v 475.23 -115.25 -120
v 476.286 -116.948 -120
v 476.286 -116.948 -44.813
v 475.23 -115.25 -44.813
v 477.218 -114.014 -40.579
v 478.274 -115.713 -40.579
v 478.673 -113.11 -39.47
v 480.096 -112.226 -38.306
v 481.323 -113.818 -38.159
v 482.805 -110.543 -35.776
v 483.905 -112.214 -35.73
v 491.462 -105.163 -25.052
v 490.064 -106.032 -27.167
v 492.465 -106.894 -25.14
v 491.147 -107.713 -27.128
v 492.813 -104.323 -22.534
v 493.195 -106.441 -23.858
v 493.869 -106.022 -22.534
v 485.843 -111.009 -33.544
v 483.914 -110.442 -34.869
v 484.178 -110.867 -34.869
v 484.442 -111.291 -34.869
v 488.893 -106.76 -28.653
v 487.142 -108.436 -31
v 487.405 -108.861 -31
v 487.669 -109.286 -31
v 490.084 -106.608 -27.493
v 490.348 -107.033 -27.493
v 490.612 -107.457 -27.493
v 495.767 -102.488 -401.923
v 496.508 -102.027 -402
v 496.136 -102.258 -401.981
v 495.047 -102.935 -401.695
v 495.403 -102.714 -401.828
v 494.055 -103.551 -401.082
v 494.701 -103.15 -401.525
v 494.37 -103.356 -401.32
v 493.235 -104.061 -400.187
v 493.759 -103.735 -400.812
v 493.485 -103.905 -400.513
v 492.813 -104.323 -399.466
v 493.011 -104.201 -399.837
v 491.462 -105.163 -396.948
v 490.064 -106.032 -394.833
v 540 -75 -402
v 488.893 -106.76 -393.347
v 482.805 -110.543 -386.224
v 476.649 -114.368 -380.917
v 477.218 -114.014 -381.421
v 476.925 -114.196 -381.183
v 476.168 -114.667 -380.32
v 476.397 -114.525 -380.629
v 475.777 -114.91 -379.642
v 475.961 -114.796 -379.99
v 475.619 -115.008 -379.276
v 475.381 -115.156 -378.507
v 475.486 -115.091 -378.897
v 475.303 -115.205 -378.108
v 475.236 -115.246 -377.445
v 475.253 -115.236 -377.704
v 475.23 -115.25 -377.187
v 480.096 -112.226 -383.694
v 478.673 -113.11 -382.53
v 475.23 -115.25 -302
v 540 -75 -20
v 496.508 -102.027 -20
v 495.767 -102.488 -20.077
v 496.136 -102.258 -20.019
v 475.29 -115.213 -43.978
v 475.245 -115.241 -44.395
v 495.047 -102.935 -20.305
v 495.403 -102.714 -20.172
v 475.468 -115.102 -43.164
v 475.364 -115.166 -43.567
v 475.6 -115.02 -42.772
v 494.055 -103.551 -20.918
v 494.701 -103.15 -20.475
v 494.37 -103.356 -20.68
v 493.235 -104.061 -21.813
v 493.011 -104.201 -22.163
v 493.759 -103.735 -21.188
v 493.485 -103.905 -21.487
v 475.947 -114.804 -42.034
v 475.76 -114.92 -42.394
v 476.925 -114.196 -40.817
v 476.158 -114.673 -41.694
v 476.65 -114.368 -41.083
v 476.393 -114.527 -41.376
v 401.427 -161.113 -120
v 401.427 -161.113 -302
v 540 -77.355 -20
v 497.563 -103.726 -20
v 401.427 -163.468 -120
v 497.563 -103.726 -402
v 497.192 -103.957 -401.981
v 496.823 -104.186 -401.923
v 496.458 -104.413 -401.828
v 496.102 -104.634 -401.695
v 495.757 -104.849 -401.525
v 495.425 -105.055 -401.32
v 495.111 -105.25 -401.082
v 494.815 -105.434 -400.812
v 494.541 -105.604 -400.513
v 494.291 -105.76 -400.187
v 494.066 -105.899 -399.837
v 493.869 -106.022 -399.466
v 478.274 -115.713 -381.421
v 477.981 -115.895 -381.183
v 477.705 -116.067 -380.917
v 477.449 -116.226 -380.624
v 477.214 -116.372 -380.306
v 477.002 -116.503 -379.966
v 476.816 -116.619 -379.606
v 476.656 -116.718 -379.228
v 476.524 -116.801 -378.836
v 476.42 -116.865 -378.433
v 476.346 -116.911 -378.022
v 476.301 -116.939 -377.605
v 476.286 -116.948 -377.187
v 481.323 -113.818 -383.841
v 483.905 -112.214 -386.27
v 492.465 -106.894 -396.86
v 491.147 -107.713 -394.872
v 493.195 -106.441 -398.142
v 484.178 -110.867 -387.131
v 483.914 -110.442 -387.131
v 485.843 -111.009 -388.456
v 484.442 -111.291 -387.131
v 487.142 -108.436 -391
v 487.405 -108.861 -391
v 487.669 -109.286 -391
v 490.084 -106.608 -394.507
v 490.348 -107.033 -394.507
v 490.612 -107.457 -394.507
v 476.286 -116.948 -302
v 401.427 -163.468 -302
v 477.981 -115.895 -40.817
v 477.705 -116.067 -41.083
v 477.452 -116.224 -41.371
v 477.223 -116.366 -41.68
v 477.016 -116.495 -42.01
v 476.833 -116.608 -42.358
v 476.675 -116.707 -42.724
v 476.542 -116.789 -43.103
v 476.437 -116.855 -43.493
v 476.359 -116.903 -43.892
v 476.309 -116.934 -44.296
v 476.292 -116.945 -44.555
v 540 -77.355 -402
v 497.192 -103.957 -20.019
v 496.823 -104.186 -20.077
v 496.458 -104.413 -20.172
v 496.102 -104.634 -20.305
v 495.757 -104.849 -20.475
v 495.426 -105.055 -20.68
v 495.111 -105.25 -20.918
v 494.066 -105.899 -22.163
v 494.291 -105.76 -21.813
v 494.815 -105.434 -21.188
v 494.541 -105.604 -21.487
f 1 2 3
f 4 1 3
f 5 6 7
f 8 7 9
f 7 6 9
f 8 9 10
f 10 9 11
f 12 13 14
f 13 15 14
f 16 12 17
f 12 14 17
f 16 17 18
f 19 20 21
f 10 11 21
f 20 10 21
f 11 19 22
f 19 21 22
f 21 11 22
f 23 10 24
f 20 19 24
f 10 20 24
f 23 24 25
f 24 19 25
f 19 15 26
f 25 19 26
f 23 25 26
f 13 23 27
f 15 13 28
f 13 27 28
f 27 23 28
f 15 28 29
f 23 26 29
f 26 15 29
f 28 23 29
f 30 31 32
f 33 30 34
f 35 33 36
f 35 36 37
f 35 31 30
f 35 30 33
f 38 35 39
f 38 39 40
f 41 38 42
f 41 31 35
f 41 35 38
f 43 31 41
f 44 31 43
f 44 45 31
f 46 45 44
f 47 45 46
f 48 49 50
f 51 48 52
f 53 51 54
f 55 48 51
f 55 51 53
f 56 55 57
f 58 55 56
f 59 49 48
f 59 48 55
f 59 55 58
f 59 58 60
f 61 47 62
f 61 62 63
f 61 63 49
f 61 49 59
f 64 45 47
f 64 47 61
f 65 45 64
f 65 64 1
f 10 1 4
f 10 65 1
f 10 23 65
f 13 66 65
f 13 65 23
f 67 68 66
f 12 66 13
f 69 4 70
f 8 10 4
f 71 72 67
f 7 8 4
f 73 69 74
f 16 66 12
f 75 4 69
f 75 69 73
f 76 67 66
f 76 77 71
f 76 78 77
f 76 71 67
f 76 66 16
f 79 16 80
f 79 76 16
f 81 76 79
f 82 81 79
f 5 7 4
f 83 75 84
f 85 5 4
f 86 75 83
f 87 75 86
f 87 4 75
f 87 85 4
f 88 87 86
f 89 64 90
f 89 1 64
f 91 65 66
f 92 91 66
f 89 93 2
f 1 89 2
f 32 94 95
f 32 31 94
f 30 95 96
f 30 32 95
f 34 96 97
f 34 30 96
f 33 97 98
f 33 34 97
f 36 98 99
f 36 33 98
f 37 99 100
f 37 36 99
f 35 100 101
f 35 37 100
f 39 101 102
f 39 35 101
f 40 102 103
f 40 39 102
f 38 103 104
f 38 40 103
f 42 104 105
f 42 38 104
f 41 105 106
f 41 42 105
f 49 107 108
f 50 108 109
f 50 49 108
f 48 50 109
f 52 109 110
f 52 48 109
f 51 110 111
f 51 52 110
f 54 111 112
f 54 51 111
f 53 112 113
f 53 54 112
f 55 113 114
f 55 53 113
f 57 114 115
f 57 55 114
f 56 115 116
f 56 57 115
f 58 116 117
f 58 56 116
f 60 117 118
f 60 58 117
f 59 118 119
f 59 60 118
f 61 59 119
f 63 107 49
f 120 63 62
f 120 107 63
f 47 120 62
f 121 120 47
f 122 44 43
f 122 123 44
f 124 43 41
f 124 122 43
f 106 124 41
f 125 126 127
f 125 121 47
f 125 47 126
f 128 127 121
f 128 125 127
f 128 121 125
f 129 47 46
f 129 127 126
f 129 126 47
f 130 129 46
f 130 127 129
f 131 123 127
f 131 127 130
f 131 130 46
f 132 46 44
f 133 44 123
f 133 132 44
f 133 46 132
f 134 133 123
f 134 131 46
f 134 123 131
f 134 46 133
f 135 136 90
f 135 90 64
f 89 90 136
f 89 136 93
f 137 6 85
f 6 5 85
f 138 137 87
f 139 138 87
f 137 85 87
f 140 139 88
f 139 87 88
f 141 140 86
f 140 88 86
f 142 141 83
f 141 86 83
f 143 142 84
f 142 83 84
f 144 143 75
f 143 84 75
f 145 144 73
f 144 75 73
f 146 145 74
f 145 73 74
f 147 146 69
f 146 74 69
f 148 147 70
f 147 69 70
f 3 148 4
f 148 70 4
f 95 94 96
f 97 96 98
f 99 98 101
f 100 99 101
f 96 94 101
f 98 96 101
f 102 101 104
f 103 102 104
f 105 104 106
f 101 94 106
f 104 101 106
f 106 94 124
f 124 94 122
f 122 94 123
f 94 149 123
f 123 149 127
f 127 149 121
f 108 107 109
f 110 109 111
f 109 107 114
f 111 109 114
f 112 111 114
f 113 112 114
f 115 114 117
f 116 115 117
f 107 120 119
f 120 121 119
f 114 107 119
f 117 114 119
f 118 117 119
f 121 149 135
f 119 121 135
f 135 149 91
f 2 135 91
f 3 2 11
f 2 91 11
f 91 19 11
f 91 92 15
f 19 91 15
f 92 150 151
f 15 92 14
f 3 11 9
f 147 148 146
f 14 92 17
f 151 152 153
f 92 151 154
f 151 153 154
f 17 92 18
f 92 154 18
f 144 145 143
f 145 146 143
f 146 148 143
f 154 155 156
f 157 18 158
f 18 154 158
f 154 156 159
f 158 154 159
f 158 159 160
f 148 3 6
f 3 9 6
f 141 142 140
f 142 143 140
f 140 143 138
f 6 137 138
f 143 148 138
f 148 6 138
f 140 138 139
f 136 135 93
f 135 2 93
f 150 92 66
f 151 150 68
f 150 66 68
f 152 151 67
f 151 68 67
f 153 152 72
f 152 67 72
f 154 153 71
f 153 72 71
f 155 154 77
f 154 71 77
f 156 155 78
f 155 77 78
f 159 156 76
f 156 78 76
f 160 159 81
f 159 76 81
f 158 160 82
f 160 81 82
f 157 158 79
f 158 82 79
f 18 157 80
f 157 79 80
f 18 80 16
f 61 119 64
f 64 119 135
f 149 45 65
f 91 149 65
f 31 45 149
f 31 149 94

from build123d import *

# Parameters (mm, degrees)
SKETCH1_W           = 163.150096709
SKETCH1_H           = 382
BOSS_EXTRUDE1_DEPTH = 2
SKETCH2_W           = 86.892857143
SKETCH2_H           = 128
CUT_EXTRUDE1_DEPTH  = 582.357037259
SKETCH3_W           = 86.892857143
SKETCH3_H           = 100
CUT_EXTRUDE2_DEPTH  = 582.357037259
DRAFT1_ANGLE        = -31.857998891
DRAFT2_ANGLE        = 31.857998891
CUT_EXTRUDE3_DEPTH  = 581.711321285
FILLET1_R           = 5


with BuildPart() as part:
    # Sketch1 → Boss-Extrude1 (new body)
    with BuildSketch(Plane(origin=(184.061246273, -296.190511244, 0), x_dir=(-0.8493588352433418, -0.5278158476155048, 0), z_dir=(-0.5278158476155048, 0.8493588352433418, 0))):
        with Locations((-337.492534105, -211)):
            Rectangle(SKETCH1_W, SKETCH1_H)
    extrude(amount=-BOSS_EXTRUDE1_DEPTH)

    # Sketch2 → Cut-Extrude1 (cut, through all)
    with BuildSketch(Plane(origin=(185.116877969, -297.889228915, 0), x_dir=(0.8493588352433415, 0.5278158476155054, 0), z_dir=(0.5278158476155053, -0.8493588352433414, 0))):
        with Locations((299.363914323, -56)):
            Rectangle(SKETCH2_W, SKETCH2_H)
    extrude(amount=-CUT_EXTRUDE1_DEPTH, mode=Mode.SUBTRACT)

    # Sketch3 → Cut-Extrude2 (cut, through all)
    with BuildSketch(Plane(origin=(185.116877969, -297.889228915, 0), x_dir=(0.8493588352433415, 0.5278158476155054, 0), z_dir=(0.5278158476155053, -0.8493588352433414, 0))):
        with Locations((299.363914323, -352)):
            Rectangle(SKETCH3_W, SKETCH3_H)
    extrude(amount=-CUT_EXTRUDE2_DEPTH, mode=Mode.SUBTRACT)

    # Draft1
    draft1_faces = [part.faces().sort_by_distance(p)[0] for p in [
        (540.527815848, -75.849358835, -211),
    ]]
    draft(draft1_faces, Plane(origin=(184.061246273, -296.190511244, 0), x_dir=(0.8493588352433418, 0.5278158476155048, 0), z_dir=(-0.5278158476155048, 0.8493588352433418, 0)), DRAFT1_ANGLE)

    # Draft2
    draft2_faces = [part.faces().sort_by_distance(p)[0] for p in [
        (401.954839737, -161.962565418, -211),
    ]]
    draft(draft2_faces, Plane(origin=(184.061246273, -296.190511244, 0), x_dir=(0.8493588352433418, 0.5278158476155048, 0), z_dir=(-0.5278158476155048, 0.8493588352433418, 0)), DRAFT2_ANGLE)

    # Sketch4 → Cut-Extrude3 (cut, through all)
    with BuildSketch(Plane(origin=(185.116877969, -297.889228915, 0), x_dir=(0.8493588352433418, 0.5278158476155048, 0), z_dir=(0.5278158476155048, -0.8493588352433418, 0))):
        with BuildLine():
            Line((342.810342894, -20), (364.810342894, -20))
            add(Edge.make_bspline(
                [(342.810342894, -42), (346.302683554, -39.942808378), (351.300668251, -36.660712559), (356.350274178, -31.060781412), (361.089343651, -26.696748792), (363.56593564, -22.694365369), (364.810342894, -20)],
                knots=[0, 0, 0, 0, 0.388085015, 0.560148038, 0.716552584, 1, 1, 1, 1], degree=3))
            Line((342.810342894, -42), (342.810342894, -20))
        make_face()
        with BuildLine():
            Line((342.810342894, -380), (342.810342894, -402))
            Line((342.810342894, -402), (364.810342894, -402))
            add(Edge.make_bspline(
                [(342.810342894, -380), (346.302683554, -382.057191622), (351.300668251, -385.339287441), (356.350274178, -390.939218588), (361.089343651, -395.303251208), (363.56593564, -399.305634631), (364.810342894, -402)],
                knots=[0, 0, 0, 0, 0.388085015, 0.560148038, 0.716552584, 1, 1, 1, 1], degree=3))
        make_face()
    extrude(amount=-CUT_EXTRUDE3_DEPTH, mode=Mode.SUBTRACT)

    # Fillet1
    fillet1_edges = [part.edges().sort_by_distance(p)[0] for p in [
        (494.443950046, -104.487189726, -20),
        (475.758055671, -116.099138374, -42),
        (494.443950046, -104.487189726, -402),
        (475.758055671, -116.099138374, -380),
    ]]
    fillet(fillet1_edges, radius=FILLET1_R)


solid = part.part
